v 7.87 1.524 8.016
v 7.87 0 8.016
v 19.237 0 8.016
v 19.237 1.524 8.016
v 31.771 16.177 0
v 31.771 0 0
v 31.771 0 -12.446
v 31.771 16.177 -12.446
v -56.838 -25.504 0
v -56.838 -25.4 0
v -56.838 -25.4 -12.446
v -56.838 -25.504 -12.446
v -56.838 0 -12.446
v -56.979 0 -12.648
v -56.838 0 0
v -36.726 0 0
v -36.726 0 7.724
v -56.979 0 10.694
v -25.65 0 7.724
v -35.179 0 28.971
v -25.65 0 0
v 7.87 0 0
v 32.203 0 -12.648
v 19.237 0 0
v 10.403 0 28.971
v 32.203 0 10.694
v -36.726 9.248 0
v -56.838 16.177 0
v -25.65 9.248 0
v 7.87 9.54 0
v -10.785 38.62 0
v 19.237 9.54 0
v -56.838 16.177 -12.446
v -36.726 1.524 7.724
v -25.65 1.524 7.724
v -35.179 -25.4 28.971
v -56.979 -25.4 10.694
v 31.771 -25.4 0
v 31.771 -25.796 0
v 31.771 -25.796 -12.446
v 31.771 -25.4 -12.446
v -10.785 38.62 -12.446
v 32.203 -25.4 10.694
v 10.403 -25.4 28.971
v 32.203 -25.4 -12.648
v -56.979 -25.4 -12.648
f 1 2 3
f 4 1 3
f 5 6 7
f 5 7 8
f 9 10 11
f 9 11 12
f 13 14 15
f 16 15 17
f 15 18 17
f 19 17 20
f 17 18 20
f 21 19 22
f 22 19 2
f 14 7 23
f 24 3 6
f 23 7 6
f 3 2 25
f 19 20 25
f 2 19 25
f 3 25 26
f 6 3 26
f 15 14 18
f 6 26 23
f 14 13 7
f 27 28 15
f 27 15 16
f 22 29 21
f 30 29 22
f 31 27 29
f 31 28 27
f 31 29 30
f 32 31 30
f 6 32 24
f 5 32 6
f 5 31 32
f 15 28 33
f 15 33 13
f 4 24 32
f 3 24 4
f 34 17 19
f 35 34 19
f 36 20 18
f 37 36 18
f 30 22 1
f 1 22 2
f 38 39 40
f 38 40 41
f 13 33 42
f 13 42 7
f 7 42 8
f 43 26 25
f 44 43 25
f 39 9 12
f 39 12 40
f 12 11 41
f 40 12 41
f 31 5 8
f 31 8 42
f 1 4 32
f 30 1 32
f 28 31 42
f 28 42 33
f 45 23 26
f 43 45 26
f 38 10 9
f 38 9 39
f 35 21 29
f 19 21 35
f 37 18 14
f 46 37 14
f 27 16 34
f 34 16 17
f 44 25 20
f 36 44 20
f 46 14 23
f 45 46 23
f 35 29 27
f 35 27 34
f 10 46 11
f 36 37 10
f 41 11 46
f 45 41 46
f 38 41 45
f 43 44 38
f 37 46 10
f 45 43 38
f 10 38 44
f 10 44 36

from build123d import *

# Parameters (mm, degrees)
F1_DEPTH    = 25.4
F3_DEPTH    = 12.446
F4_W        = 11.3675398752
F4_H        = 8.0155739561
F4_W_2      = 11.0760703683
F4_H_2      = 7.7240983956
F5_DEPTH    = 14.224
F6_T4_DEPTH = 76.6882877695
F7_T4_DEPTH = 76.3968182626


# Not quite as in the source:
# - a fillet or chamfer that OpenCascade refuses, or shapes differently, is made with other operations: its cross-section is extruded or revolved along the edge and cut away or added


with BuildPart() as f1:
    # F0 (on Front) → F1 (new body)
    with BuildSketch(Plane.XZ):
        Polygon((-56.9788375091, 10.6936474436), (-56.9788375091, -12.6478849719), (32.2034358534, -12.6478849719), (32.2034358534, 10.6936474436), (10.4033187203, 28.9705070476), (-35.1787281407, 28.9705070476), align=None)
    extrude(amount=F1_DEPTH)

    # F2 (on Top) → F3 (join)
    with BuildSketch(Plane.XY):
        Polygon((-56.8377040327, 0), (-56.8377040327, -25.5040973425), (31.7708179355, -25.7955752313), (31.7708179355, 0), align=None)
        Polygon((-56.8377040327, 16.1768849939), (-56.8377040327, 0), (31.7708179355, 0), (31.7708179355, 16.1768849939), (-10.7845906168, 38.6204943061), align=None)
    extrude(amount=-F3_DEPTH)

    # F4 (on Front) → F5 (join)
    with BuildSketch(Plane.XZ):
        with Locations((13.5536068119, 4.007786978)):
            Rectangle(F4_W, F4_H)
        with Locations((-31.1878696084, 3.8620491978)):
            Rectangle(F4_W_2, F4_H_2)
    extrude(amount=-F5_DEPTH)

    # F6: chamfer of 12.7 on 1 edges, made by hand


with BuildPart() as f6_tool2:
    # F6_s3 → F6_t4 (new body)
    with BuildSketch(Plane.YZ.offset(51.8977506967)):
        Polygon((1.524, 8.0155739561), (14.224, -4.6844260439), (14.224, 8.0155739561), align=None)
    extrude(amount=-F6_T4_DEPTH)

    split(bisect_by=Plane.XY, keep=Keep.TOP)


with BuildPart() as f1_1:
    add(f1.part)

    # F6_t1: cut F6_tool2
    add(f6_tool2.part, mode=Mode.SUBTRACT)

    # F7: chamfer of 12.7 on 1 edges, made by hand


with BuildPart() as f7_tool2:
    # F7_s3 → F7_t4 (new body)
    with BuildSketch(Plane.YZ.offset(7.0105395229)):
        Polygon((14.224, -4.9759016044), (1.524, 7.7240983956), (14.224, 7.7240983956), align=None)
    extrude(amount=-F7_T4_DEPTH)

    split(bisect_by=Plane.XY, keep=Keep.TOP)


with BuildPart() as f1_2:
    add(f1_1.part)

    # F7_t1: cut F7_tool2
    add(f7_tool2.part, mode=Mode.SUBTRACT)


solid = f1_2.part
